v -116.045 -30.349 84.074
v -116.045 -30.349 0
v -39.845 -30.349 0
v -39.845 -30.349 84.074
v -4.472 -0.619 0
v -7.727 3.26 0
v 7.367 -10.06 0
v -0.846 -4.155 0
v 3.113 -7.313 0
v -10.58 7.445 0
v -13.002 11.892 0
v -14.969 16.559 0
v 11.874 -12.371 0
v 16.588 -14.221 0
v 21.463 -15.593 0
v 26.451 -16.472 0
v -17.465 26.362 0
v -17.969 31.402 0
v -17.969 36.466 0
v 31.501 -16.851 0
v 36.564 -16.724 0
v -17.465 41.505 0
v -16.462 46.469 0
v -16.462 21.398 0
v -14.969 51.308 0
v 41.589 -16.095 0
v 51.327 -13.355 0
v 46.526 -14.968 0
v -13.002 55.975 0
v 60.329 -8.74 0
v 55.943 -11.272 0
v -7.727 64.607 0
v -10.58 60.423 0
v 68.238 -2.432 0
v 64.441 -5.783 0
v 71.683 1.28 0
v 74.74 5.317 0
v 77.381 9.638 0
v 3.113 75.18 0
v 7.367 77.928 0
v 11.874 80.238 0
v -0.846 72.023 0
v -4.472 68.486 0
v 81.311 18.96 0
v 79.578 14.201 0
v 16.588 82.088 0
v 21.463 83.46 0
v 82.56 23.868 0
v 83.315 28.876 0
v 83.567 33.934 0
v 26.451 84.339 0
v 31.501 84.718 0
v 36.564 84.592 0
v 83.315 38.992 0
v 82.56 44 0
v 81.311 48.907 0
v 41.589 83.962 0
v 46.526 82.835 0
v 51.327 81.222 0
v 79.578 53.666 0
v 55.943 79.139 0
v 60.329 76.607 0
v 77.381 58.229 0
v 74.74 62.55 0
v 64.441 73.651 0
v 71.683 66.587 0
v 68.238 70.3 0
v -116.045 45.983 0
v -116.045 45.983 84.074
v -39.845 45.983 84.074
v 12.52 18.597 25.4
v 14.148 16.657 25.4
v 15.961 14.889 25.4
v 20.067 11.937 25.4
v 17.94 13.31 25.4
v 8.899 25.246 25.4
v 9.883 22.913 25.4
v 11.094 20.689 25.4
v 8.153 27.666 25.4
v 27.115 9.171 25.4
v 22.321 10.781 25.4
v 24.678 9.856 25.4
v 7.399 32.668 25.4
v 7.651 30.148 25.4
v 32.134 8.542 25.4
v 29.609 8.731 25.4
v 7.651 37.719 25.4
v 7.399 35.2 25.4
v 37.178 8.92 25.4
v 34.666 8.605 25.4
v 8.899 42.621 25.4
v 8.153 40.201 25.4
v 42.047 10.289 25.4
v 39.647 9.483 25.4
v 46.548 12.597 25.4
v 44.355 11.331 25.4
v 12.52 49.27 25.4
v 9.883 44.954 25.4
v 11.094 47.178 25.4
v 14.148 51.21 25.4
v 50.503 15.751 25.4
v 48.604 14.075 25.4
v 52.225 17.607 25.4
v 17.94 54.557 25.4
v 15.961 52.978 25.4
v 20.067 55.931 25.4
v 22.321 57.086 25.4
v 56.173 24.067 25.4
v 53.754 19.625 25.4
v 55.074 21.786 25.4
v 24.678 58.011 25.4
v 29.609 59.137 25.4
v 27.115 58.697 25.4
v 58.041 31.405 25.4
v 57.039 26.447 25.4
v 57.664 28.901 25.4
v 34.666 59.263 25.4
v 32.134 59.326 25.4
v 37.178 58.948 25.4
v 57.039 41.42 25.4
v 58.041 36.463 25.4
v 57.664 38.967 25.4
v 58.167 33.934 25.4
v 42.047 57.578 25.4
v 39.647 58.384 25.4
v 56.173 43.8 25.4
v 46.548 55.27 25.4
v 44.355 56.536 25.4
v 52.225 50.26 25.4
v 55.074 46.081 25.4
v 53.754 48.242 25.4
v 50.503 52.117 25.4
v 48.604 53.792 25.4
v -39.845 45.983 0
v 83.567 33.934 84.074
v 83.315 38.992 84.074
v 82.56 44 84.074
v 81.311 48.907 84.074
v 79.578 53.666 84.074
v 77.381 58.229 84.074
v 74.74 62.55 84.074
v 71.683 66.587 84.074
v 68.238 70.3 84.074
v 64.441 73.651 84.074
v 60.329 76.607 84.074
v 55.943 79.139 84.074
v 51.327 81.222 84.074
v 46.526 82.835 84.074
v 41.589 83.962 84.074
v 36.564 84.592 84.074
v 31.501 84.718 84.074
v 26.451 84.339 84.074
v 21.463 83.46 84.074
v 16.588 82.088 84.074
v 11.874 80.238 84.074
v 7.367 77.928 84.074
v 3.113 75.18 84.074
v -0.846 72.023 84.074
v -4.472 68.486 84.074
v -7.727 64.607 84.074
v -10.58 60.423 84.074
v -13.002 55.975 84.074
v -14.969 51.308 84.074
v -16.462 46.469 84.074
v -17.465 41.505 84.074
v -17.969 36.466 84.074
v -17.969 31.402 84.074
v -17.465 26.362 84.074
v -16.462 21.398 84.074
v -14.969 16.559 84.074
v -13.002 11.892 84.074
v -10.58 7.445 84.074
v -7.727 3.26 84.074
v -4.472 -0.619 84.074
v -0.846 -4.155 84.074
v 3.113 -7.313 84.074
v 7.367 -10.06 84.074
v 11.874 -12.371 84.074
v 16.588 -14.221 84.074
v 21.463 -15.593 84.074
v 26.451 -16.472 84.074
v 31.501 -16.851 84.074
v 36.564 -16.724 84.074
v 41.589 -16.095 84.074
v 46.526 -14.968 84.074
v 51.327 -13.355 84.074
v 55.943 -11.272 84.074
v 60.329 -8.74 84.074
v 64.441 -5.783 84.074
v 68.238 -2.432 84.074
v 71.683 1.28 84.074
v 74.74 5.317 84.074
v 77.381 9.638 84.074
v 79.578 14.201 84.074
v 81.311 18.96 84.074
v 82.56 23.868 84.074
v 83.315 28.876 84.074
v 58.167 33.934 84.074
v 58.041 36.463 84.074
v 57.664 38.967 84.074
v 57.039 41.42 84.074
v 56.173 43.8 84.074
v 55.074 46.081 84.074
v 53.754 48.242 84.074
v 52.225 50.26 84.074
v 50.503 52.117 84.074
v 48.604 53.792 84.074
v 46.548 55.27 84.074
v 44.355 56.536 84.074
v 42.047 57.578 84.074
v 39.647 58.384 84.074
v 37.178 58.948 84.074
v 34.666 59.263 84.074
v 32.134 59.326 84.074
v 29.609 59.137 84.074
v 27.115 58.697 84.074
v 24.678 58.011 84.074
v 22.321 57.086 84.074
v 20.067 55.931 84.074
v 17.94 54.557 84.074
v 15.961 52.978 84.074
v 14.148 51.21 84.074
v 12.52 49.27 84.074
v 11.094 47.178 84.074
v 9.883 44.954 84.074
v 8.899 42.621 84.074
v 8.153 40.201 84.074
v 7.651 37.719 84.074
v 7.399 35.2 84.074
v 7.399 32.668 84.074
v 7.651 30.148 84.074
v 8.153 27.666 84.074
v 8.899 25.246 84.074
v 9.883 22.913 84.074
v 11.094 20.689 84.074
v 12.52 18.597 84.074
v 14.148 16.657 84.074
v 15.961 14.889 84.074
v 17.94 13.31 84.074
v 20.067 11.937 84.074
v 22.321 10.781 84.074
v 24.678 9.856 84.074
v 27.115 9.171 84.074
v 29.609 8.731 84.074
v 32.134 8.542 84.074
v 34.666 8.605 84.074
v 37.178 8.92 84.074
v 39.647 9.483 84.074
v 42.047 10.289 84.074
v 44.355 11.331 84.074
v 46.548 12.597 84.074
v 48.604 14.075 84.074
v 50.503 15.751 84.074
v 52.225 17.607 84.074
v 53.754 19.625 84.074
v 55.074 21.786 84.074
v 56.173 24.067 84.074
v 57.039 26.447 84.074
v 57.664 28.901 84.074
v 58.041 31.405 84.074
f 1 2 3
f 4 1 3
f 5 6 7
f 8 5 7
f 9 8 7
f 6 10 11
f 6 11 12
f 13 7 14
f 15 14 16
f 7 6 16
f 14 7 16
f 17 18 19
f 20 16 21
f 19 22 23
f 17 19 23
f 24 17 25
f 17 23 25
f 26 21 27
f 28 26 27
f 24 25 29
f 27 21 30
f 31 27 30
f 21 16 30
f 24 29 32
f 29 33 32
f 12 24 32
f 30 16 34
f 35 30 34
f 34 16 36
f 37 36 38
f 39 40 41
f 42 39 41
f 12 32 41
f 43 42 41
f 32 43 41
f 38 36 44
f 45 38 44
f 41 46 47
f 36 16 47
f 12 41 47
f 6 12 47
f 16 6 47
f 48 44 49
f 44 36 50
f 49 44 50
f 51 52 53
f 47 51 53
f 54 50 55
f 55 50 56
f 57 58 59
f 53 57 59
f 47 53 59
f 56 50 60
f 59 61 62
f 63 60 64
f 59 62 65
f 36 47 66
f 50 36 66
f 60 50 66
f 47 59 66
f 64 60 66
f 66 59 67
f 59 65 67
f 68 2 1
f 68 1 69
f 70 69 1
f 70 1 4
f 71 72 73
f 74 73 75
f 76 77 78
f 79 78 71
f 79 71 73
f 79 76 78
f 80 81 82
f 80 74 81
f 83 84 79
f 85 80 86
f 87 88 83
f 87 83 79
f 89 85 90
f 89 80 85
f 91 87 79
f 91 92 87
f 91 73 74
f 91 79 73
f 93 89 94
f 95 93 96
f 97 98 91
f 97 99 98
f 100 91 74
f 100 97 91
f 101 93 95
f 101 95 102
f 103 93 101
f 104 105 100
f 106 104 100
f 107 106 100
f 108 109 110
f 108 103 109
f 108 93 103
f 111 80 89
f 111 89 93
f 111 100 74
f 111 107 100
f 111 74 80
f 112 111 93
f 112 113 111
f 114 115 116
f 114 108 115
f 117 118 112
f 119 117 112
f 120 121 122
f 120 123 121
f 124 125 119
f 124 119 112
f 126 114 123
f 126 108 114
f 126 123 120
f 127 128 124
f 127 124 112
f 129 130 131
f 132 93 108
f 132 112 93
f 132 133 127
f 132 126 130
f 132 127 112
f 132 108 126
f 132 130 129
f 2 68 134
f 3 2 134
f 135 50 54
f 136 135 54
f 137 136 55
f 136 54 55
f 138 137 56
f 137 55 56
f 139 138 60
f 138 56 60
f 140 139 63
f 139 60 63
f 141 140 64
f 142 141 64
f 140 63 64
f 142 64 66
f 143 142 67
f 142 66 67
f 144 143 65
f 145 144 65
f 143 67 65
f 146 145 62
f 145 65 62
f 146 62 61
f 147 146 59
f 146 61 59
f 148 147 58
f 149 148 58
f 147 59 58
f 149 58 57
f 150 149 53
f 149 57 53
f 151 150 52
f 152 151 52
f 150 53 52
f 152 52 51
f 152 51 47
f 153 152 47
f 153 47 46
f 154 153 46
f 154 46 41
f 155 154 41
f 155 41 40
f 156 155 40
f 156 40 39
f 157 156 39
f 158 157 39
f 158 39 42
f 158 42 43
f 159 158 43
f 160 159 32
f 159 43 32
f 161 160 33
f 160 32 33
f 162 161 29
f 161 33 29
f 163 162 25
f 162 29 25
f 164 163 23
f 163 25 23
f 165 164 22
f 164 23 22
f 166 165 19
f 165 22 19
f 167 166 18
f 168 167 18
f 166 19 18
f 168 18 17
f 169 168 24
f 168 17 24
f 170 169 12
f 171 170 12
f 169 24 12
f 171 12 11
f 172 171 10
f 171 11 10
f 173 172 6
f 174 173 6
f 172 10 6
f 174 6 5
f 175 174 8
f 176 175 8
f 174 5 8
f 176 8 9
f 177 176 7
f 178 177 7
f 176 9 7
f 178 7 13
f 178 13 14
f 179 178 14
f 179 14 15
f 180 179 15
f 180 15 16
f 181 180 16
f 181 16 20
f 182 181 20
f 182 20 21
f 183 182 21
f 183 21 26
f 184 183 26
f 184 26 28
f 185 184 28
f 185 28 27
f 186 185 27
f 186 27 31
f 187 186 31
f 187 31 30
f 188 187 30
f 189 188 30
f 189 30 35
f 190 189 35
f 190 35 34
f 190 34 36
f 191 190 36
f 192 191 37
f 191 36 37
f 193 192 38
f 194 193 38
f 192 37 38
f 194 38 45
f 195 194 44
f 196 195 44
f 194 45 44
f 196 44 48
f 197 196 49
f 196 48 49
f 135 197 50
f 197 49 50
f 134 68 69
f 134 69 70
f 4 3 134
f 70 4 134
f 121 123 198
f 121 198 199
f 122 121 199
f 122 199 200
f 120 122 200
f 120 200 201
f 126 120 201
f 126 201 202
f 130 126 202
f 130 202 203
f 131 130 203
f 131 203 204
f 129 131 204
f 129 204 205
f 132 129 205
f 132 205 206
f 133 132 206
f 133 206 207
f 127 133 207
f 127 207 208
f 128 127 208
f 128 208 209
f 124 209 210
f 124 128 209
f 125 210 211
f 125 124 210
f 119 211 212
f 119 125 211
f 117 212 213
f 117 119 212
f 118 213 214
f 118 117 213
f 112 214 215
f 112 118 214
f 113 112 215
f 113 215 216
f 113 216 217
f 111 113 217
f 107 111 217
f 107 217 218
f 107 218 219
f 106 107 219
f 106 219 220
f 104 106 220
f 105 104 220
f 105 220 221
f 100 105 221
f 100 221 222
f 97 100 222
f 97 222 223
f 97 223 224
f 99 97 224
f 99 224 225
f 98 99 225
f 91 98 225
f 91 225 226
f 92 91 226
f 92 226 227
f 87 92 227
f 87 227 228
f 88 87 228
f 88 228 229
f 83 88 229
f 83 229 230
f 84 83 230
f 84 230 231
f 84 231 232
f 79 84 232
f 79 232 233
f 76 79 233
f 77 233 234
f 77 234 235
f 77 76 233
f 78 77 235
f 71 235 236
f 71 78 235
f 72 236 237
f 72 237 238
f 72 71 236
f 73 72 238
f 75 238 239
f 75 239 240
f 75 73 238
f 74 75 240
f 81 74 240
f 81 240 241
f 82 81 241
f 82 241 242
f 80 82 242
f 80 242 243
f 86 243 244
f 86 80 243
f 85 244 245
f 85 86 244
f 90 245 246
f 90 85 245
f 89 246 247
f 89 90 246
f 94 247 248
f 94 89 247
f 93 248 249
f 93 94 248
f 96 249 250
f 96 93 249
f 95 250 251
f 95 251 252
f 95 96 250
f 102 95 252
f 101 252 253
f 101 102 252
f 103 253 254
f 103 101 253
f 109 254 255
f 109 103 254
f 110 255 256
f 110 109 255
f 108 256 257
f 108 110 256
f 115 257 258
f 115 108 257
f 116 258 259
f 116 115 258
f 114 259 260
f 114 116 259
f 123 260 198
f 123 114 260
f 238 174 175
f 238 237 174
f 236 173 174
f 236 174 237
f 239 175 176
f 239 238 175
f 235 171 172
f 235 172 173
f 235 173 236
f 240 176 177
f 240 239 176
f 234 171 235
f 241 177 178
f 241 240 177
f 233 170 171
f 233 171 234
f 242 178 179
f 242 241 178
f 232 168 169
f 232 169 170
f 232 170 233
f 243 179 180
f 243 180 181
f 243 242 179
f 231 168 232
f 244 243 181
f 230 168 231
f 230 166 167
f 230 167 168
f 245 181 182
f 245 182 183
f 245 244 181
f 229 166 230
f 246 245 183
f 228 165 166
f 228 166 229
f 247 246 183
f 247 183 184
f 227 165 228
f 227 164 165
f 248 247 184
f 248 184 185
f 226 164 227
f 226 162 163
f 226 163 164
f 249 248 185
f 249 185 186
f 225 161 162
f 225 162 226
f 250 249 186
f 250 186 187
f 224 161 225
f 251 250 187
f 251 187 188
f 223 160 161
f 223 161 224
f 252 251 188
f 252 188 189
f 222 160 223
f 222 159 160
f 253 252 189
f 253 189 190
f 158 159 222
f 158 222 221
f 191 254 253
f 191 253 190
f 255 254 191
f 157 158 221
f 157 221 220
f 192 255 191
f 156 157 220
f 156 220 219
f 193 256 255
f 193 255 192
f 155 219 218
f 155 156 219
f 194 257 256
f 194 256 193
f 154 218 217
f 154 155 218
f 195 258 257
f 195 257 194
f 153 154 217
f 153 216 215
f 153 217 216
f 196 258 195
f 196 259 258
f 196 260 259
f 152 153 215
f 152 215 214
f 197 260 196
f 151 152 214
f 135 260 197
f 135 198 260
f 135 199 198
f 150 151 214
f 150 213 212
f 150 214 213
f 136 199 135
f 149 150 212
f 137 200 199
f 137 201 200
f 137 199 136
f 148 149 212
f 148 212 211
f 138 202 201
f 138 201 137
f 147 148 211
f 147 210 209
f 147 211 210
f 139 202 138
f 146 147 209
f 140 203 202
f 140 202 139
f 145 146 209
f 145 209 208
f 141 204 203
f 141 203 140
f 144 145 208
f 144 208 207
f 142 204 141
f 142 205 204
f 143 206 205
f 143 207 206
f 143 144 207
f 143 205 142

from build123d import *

# Parameters (mm, degrees)
F0_W     = 76.2
F0_H     = 76.3321408214
F1_DEPTH = 84.074
F0_R     = 50.8
F2_T     = -25.4


with BuildPart() as f1:
    # F0 (on Top) → F1 (new body)
    with BuildSketch(Plane.XY):
        with Locations((-77.9446905811, 7.8171525478)):
            Rectangle(F0_W, F0_H)
    extrude(amount=F1_DEPTH)


with BuildPart() as f1b:
    # F0 (on Top) → F1, piece 2 (new body)
    with BuildSketch(Plane.XY):
        with Locations((32.7674816028, 33.9336769251)):
            Circle(F0_R)
    extrude(amount=F1_DEPTH)

    # F2
    f2_openings = [f1b.faces().sort_by_distance(p)[0] for p in [
        (32.767482, 33.933677, 84.074),
    ]]
    offset(amount=F2_T, openings=f2_openings)


solid = Compound([f1.part, f1b.part])
